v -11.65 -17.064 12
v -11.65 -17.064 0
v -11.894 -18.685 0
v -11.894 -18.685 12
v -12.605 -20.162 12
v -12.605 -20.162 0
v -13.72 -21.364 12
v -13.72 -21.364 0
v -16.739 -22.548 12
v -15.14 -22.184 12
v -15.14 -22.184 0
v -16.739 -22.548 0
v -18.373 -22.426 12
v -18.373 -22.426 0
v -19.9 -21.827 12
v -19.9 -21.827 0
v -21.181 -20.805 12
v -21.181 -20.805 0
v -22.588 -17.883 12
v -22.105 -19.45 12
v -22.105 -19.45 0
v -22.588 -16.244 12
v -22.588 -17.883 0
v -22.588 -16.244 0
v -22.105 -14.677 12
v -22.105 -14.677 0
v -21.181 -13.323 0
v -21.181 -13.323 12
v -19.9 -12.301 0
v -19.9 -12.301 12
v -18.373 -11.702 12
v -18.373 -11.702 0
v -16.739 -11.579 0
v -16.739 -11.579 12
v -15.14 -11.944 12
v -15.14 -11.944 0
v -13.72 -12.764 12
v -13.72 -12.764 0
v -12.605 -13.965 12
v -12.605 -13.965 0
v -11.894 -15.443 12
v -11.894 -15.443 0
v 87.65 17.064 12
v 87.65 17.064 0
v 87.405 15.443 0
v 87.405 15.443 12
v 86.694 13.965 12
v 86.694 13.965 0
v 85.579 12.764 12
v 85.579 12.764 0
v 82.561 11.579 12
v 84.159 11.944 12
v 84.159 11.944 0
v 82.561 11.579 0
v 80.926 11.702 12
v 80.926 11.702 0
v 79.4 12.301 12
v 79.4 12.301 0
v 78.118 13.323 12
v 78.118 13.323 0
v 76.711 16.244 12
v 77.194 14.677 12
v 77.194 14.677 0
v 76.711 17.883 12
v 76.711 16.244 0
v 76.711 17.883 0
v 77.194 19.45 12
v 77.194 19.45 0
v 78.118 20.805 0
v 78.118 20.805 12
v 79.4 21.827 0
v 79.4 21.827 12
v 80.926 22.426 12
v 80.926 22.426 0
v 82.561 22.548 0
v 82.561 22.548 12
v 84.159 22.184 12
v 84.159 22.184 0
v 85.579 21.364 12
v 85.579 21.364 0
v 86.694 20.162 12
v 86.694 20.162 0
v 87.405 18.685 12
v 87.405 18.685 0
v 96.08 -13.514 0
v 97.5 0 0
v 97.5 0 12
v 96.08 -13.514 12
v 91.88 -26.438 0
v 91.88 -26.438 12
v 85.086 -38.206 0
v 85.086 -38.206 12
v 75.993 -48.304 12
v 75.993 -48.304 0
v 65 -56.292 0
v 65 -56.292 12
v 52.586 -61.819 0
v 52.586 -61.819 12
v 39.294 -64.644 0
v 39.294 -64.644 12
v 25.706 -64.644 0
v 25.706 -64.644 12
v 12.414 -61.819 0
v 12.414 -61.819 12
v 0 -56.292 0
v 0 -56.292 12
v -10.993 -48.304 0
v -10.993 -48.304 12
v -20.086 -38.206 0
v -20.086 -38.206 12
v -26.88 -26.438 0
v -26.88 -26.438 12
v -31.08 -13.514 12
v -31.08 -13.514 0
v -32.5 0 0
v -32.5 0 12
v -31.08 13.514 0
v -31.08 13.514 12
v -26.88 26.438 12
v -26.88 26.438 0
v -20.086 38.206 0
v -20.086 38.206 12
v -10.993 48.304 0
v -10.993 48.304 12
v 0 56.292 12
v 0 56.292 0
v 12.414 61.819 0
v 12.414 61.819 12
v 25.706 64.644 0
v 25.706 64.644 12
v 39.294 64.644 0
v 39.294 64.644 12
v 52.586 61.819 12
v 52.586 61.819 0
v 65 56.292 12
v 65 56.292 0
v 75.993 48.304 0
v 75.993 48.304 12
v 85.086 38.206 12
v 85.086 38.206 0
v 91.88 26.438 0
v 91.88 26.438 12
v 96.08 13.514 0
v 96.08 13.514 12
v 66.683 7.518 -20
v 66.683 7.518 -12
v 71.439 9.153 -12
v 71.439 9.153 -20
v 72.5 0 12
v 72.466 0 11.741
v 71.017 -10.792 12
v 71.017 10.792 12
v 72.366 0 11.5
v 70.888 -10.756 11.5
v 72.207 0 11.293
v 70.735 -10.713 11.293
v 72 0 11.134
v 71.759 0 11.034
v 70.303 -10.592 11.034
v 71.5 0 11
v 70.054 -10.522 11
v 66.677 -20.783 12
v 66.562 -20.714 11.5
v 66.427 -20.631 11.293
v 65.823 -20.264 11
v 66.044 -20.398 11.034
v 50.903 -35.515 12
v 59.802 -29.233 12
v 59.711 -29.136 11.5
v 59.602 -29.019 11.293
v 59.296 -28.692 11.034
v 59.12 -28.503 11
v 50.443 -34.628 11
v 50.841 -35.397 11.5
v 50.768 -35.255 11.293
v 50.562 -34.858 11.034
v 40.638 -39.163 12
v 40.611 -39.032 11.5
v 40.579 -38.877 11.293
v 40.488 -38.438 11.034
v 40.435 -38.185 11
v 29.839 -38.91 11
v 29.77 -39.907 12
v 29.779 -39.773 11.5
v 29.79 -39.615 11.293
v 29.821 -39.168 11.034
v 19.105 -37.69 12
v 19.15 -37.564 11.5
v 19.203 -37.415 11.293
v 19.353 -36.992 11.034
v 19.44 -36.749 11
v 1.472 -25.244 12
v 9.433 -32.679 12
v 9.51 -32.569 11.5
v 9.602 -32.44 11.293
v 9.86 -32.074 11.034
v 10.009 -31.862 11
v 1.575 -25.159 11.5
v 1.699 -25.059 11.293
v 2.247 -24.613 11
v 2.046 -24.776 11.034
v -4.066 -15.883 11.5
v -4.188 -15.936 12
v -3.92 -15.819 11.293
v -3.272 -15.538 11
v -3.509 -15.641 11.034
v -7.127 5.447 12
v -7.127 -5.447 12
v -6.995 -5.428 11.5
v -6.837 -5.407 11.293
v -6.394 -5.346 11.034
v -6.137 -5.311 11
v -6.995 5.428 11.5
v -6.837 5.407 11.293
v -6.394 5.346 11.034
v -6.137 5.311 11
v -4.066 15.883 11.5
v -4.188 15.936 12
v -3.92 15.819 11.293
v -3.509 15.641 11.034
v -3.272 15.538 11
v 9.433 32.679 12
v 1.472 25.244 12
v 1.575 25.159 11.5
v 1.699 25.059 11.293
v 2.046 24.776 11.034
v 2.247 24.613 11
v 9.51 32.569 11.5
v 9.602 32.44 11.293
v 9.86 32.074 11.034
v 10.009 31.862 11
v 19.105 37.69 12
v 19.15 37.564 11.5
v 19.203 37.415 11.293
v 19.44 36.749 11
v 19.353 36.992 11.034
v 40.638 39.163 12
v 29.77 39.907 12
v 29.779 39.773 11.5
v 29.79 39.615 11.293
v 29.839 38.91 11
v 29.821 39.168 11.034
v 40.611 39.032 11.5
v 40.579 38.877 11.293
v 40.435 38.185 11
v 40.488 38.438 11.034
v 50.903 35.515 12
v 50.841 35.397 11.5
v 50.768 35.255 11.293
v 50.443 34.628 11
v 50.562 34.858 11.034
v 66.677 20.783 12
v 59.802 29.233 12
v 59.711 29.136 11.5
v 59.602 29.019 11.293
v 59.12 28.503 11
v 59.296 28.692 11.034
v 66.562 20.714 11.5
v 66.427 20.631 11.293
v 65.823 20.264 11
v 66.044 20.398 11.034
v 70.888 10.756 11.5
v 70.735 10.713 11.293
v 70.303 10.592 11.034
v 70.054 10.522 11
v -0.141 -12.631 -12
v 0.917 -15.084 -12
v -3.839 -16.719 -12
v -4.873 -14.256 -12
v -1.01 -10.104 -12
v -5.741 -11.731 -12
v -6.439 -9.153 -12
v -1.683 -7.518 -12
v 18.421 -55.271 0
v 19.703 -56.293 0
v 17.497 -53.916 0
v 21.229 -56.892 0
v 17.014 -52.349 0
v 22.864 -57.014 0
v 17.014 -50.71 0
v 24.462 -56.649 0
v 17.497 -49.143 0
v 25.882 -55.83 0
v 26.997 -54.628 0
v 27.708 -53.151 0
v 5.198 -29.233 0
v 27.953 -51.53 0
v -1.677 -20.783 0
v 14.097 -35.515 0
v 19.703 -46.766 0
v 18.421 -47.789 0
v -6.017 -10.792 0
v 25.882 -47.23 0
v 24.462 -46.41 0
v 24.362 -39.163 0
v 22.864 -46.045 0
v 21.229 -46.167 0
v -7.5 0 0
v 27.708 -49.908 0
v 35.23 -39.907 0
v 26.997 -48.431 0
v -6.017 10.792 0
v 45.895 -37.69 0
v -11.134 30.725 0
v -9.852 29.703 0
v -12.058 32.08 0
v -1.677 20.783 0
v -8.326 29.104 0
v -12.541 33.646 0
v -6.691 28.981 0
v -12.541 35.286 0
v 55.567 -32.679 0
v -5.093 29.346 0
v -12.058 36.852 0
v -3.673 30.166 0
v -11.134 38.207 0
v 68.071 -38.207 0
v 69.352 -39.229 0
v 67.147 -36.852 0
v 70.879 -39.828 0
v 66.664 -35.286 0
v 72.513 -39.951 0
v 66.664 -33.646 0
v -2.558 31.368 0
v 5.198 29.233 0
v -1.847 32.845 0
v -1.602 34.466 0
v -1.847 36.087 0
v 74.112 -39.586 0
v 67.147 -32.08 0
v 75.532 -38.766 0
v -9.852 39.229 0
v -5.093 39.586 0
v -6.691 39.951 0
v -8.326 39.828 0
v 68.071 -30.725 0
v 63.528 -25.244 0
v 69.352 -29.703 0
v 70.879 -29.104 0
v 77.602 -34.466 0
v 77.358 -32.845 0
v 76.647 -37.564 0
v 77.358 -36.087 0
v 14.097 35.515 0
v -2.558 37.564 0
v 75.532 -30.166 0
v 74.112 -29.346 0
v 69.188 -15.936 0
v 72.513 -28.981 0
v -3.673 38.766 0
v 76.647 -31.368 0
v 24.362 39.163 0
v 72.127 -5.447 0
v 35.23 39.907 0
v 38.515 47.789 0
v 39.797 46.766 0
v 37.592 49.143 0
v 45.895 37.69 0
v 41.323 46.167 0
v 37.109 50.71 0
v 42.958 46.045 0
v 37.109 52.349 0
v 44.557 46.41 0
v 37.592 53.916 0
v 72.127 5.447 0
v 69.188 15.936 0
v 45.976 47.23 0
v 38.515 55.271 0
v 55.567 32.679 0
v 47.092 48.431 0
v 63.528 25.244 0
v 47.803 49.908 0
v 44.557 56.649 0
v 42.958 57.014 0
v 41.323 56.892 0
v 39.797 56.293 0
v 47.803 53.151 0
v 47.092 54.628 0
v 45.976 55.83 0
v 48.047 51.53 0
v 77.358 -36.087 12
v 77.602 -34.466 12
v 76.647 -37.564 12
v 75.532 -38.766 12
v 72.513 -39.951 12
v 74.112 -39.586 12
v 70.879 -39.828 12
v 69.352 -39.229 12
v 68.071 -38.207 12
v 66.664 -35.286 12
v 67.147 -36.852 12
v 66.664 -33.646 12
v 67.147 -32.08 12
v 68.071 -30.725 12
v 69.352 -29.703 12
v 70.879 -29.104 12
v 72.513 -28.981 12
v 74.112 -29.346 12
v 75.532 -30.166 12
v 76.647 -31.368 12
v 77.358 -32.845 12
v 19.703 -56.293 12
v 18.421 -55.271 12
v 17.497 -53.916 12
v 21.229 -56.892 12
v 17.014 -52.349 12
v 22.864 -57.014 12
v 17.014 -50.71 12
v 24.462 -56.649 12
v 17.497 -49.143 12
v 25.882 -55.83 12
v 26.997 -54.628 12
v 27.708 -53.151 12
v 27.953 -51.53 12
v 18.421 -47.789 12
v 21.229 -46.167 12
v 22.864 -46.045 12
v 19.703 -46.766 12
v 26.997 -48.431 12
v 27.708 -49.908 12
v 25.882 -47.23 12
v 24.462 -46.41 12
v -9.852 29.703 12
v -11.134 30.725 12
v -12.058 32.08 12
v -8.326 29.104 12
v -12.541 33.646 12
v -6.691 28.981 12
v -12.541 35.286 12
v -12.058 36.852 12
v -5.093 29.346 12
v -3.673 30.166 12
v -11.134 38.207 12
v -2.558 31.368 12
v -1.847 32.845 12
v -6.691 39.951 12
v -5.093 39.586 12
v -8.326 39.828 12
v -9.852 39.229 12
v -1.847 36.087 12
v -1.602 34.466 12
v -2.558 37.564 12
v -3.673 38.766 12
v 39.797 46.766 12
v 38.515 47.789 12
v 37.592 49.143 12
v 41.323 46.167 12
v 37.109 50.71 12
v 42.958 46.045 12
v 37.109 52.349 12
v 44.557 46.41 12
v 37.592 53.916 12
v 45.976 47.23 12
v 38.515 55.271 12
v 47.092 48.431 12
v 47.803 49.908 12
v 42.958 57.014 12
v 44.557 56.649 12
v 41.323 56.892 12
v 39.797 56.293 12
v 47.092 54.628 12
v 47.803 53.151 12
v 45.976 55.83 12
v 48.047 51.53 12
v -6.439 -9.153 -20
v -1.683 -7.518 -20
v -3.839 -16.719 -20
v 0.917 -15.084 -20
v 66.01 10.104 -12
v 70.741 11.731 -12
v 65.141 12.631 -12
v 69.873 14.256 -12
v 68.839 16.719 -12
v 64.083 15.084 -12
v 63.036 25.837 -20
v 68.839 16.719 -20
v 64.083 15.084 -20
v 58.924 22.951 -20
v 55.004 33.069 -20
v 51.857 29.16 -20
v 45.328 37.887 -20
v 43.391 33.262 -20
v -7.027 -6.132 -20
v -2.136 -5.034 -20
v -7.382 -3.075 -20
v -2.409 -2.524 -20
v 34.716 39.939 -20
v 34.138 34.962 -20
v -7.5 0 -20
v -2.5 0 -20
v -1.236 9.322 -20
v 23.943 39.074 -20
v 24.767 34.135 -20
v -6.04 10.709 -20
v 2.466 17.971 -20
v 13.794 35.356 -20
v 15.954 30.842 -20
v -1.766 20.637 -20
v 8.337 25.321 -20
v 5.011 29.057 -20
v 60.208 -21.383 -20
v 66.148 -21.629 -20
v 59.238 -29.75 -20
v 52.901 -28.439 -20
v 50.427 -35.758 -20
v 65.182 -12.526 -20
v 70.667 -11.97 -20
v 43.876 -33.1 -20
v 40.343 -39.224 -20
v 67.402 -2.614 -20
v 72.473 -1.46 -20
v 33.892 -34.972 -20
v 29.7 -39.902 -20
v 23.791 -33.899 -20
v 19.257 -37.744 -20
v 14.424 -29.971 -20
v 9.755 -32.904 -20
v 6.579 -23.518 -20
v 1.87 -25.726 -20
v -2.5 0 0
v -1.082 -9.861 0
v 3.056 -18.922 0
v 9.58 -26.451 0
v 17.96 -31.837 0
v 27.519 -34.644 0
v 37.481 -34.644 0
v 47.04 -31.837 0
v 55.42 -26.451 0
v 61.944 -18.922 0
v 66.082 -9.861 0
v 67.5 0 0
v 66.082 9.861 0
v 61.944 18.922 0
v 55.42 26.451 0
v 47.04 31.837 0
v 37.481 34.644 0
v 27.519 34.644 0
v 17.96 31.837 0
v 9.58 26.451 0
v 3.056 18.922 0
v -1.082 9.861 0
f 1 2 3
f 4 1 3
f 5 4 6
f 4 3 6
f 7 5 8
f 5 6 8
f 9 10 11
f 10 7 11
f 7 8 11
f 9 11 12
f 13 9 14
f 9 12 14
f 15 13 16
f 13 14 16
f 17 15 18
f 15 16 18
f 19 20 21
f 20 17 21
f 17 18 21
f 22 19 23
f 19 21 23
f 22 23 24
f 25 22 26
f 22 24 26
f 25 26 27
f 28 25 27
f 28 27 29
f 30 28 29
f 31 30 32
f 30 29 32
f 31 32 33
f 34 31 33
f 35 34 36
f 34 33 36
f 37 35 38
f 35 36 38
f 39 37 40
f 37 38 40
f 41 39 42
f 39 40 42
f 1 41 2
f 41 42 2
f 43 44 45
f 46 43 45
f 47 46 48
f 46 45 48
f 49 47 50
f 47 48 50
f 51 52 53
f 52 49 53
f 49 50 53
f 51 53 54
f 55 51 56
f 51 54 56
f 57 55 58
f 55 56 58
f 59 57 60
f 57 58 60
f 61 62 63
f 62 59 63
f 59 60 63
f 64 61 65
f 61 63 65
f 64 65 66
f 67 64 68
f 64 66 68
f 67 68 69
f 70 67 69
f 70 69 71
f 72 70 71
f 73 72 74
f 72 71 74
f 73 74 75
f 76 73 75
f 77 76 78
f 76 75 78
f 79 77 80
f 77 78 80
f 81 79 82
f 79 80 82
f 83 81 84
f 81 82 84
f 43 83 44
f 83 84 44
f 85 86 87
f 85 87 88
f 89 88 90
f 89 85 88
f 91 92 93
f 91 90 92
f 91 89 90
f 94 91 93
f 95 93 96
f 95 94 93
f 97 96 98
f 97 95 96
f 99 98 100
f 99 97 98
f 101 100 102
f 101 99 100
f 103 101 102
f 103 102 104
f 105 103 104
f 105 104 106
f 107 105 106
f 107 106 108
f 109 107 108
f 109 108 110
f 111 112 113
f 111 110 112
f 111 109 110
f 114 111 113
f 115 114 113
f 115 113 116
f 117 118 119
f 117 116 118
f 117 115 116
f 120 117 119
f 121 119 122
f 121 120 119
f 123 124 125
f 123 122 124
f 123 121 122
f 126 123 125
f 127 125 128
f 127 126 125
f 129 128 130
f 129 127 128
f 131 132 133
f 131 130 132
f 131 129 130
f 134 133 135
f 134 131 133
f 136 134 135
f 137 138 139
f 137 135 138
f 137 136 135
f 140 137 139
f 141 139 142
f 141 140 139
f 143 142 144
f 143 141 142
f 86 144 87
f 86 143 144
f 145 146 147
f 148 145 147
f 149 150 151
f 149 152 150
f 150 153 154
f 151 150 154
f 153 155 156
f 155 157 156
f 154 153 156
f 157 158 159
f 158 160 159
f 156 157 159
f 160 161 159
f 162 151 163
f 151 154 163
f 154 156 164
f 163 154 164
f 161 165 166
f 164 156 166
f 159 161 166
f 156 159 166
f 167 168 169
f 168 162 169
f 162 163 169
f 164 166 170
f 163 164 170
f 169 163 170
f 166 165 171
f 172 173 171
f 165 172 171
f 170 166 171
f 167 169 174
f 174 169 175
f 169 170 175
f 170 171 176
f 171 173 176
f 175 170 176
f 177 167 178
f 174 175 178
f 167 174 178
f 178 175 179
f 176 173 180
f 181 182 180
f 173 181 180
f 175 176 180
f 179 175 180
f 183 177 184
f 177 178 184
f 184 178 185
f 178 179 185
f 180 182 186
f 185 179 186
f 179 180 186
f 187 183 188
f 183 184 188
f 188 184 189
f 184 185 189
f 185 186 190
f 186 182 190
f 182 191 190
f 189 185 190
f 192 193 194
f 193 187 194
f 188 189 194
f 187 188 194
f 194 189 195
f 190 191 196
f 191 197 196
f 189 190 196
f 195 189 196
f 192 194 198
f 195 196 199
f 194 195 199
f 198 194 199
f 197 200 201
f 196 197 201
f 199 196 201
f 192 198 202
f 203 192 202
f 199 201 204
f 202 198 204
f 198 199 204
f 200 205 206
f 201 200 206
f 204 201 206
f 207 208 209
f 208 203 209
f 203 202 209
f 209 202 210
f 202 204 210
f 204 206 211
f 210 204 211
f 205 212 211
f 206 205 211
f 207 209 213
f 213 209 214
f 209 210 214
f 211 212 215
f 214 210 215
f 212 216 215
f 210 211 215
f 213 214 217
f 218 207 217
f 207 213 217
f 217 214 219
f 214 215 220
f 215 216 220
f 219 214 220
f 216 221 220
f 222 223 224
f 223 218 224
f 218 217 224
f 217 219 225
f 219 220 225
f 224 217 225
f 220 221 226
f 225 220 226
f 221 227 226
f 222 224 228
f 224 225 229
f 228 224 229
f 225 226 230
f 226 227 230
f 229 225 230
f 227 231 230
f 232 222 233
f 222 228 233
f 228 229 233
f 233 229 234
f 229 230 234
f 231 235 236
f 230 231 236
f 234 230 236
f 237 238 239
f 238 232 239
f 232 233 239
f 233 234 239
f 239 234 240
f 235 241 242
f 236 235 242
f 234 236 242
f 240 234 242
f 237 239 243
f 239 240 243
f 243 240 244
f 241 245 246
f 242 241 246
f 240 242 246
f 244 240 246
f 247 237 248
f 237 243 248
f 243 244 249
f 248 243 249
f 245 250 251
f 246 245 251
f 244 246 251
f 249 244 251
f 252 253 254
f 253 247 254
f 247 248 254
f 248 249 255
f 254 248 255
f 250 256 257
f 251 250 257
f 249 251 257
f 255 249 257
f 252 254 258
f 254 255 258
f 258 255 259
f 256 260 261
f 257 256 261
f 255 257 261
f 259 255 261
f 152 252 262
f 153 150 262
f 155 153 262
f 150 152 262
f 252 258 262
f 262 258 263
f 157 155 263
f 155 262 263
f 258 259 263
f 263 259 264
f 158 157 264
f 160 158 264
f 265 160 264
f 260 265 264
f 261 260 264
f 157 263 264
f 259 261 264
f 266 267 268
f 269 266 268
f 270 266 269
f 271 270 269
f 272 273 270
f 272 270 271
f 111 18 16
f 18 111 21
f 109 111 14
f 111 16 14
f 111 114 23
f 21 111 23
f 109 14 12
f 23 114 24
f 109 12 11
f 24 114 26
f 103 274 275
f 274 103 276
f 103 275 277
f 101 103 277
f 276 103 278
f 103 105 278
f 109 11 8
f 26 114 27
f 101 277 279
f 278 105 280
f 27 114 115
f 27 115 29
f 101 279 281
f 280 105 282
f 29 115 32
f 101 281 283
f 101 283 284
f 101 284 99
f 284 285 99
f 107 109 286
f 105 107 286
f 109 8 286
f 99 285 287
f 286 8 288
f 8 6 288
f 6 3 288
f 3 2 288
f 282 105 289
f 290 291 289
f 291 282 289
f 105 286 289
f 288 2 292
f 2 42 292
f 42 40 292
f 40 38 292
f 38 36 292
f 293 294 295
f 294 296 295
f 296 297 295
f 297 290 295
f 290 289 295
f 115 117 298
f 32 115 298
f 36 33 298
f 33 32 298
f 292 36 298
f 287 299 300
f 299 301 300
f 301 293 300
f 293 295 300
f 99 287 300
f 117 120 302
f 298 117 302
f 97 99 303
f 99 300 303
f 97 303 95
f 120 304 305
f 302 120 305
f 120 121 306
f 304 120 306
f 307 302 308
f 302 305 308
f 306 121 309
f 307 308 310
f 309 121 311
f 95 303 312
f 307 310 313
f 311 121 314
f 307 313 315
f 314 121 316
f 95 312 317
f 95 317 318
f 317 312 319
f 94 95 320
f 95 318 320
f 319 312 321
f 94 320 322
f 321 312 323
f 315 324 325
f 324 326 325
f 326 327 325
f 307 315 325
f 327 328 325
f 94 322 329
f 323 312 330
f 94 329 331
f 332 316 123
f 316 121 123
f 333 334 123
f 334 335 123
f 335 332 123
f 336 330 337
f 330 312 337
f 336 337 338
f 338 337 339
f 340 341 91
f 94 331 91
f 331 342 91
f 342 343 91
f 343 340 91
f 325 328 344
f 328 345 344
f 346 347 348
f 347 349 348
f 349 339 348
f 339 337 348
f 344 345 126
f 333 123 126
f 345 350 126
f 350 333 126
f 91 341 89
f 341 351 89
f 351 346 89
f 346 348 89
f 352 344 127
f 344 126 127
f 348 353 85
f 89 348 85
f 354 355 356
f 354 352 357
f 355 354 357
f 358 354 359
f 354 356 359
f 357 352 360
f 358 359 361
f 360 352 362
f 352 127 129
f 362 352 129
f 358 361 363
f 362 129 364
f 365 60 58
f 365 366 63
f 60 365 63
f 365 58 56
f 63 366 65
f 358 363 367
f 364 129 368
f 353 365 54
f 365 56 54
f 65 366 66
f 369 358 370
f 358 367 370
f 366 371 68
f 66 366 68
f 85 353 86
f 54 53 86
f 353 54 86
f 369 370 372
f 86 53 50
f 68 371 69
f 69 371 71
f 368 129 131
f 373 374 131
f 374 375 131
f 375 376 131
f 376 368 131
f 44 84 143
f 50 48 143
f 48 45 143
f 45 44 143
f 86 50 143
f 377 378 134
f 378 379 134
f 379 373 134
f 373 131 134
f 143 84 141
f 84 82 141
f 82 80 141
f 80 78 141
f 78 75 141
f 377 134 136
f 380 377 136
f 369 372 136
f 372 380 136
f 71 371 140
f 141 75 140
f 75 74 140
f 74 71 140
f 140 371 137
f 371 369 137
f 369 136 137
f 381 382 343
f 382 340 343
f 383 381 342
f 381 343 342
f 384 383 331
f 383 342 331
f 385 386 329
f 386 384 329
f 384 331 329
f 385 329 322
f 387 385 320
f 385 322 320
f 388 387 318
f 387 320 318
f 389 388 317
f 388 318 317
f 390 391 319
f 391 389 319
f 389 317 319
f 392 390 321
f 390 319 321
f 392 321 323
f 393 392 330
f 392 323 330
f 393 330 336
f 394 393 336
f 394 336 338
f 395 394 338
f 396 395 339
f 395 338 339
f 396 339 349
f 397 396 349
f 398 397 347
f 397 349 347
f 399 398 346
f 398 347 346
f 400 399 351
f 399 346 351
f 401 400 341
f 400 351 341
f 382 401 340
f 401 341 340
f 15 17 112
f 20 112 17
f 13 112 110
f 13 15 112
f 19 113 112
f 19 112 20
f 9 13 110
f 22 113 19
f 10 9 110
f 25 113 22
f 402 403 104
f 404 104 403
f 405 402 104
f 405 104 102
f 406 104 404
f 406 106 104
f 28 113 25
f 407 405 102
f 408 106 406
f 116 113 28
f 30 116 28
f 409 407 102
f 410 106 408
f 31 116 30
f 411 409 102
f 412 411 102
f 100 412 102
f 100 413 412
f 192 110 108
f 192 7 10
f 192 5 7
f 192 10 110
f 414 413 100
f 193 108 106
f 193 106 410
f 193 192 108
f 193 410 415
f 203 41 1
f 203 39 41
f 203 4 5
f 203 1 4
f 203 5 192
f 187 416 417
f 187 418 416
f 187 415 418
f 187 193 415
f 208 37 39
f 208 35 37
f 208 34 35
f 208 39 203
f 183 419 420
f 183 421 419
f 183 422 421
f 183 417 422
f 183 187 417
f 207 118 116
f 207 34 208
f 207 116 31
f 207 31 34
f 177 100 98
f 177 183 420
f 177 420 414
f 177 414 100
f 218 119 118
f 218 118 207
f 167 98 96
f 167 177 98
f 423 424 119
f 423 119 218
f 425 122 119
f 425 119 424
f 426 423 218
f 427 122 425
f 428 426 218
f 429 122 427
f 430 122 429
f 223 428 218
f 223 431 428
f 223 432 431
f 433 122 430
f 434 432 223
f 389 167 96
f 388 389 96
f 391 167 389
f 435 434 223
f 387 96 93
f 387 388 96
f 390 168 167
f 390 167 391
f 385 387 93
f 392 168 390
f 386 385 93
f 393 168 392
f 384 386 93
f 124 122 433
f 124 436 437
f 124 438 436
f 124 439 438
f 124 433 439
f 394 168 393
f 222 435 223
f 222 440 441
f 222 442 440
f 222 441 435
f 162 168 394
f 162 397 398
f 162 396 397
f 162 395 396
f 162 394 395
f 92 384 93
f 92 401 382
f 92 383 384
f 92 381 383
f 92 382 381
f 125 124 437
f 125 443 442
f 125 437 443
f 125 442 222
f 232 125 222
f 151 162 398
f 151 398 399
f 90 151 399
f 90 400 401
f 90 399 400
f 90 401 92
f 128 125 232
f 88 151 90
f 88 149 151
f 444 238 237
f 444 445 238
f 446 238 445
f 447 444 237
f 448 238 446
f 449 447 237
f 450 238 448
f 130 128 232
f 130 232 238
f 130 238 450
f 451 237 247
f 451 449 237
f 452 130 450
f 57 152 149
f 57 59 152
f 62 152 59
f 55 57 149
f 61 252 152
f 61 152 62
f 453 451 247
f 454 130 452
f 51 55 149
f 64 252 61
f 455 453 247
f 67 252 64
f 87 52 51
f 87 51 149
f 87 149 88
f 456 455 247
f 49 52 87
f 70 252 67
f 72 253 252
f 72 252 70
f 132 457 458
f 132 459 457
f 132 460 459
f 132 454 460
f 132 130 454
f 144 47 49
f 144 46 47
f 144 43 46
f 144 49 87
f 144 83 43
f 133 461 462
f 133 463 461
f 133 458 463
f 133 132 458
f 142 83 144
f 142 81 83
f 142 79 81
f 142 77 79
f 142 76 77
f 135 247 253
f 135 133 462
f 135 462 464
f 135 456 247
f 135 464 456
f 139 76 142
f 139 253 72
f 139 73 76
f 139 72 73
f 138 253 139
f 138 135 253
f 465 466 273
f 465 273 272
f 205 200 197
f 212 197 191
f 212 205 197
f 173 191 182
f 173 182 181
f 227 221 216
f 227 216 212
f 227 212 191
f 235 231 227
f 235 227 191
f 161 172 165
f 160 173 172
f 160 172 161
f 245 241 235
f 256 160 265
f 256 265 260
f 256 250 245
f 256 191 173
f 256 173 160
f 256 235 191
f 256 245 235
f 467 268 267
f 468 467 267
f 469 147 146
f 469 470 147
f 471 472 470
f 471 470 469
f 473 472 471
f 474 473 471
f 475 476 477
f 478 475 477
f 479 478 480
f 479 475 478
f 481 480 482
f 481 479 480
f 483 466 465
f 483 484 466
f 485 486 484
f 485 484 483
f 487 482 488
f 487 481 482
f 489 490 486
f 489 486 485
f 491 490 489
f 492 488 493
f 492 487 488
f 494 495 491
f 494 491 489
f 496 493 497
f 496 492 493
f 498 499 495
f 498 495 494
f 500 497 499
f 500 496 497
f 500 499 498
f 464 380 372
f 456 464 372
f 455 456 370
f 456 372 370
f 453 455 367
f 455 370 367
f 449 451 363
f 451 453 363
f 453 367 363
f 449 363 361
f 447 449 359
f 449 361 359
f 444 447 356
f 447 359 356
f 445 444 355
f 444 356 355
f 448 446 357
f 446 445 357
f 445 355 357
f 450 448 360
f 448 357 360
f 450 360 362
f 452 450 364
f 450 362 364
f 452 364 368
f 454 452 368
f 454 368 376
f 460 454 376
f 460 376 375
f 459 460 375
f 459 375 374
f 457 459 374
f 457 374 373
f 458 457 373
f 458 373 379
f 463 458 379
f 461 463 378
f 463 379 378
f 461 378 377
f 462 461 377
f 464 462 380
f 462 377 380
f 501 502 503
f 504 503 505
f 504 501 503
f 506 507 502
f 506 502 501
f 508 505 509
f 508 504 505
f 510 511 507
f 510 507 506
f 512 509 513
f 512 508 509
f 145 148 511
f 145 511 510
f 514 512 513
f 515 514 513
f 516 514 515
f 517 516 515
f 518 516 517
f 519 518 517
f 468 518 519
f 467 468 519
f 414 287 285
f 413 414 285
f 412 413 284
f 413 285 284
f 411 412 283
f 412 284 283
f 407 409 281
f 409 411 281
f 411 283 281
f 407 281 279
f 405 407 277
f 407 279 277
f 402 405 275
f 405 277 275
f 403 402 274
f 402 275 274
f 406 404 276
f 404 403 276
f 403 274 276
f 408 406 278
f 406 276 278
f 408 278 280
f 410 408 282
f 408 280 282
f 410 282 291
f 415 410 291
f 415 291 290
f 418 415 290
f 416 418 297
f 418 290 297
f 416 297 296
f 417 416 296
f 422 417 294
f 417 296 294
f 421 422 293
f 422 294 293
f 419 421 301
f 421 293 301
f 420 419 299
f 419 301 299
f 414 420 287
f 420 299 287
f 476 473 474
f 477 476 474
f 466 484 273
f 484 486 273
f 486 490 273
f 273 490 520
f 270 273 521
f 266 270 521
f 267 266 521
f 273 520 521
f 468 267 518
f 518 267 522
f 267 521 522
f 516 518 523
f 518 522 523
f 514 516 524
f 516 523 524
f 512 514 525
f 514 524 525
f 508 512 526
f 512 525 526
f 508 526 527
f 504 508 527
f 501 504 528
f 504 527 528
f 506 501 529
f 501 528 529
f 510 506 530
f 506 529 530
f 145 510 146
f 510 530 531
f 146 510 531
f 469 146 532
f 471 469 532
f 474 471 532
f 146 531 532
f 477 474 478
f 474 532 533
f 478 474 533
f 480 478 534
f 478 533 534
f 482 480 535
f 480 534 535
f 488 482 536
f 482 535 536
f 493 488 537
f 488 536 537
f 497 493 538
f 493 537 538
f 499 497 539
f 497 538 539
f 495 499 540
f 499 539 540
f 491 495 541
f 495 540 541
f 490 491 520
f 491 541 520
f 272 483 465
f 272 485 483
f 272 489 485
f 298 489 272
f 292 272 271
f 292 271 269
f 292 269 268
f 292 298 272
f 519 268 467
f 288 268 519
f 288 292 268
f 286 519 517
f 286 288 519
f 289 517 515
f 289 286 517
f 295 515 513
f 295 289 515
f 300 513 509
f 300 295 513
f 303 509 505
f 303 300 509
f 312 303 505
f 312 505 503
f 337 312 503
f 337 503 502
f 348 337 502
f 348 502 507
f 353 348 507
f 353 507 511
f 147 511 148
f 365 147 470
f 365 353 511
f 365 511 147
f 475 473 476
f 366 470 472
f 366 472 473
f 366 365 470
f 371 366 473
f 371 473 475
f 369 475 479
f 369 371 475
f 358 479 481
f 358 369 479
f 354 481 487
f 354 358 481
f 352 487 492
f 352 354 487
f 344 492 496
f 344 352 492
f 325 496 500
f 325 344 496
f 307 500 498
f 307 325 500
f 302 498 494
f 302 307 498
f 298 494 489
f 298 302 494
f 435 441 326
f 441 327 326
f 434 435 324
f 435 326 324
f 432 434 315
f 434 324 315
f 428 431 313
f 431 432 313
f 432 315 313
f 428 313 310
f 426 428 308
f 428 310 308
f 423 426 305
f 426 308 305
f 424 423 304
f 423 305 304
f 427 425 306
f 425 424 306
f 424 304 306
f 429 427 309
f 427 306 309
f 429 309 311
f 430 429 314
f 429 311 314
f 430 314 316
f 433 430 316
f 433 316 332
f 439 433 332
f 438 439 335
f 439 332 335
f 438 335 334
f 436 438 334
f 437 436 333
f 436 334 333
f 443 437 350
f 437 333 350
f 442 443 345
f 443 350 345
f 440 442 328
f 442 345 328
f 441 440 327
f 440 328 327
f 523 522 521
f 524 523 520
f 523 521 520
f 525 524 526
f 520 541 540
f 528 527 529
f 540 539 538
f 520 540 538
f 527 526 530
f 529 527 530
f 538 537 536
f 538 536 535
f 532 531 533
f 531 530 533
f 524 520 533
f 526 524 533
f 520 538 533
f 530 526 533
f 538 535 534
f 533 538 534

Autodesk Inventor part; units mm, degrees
ref_plane "YZ Plane" through (0, 0, 0) normal (1, 0, 0) x (0, 1, 0)
ref_plane "工作平面1" through (0, 0, 0) normal (0, 0, 1) x (1, 0, 0)
sketch "草图1" plane through (0, 0, 0) normal (0, 0, 1) x (1, 0, 0)
  arc A0 (32.5, 65) -> (32.5, -65) centre (32.5, 0) ccw construction
  line L0 (32.5, -65) -> (32.5, -40) construction
  arc A1 (32.5, 40) -> (32.5, -40) centre (32.5, 0) ccw construction
  line L1 (32.5, 40) -> (32.5, 65) construction
  circle A2 centre (32.5, 0) radius 65 projected
  circle A3 centre (72.1024, -34.466) radius 5.5 projected
  circle A4 centre (-17.1496, -17.0637) radius 5.5 projected
  circle A5 centre (82.1496, 17.0637) radius 5.5 projected
  circle A6 centre (42.5472, 51.5296) radius 5.5 projected
  circle A7 centre (22.4528, -51.5296) radius 5.5 projected
  circle A8 centre (-7.1024, 34.466) radius 5.5 projected
  circle A9 centre (32.5, 0) radius 65 projected
  circle A10 centre (32.5, 0) radius 40 construction
  point P0 (0, 0)
extrude "拉伸1" add sketch "草图1" along normal blind 12
sketch "草图2" plane through (32.5, 0, 0) normal (0, 0, -1) x (-1, 0, 0)
  circle A0 centre (0, 0) radius 65 construction
  circle A1 centre (0, 0) radius 40
  circle A2 centre (0, 0) radius 35
  point P0 (32.5, 0)
  dimension "d2" = 80
  dimension "d3" = 70
extrude "拉伸2" add sketch "草图2" along normal blind 20
sketch "草图3" plane through (32.5, 0, 12) normal (0, 0, 1) x (1, 0, 0)
  circle A0 centre (0, 0) radius 65 construction
  circle A1 centre (0, 0) radius 40
  point P0 (-32.5, 0)
  dimension "d6" = 80
extrude "拉伸3" cut sketch "草图3" against normal blind 1
fillet "圆角1" radius 1 1 edges at (-7.5, 0, 11)
sketch "草图4" plane through (32.5, 0, -20) normal (0, 0, -1) x (-1, 0, 0)
  circle A0 centre (0, 0) radius 35 construction
  circle A1 centre (49.6496, -17.0637) radius 5.5 construction
  circle A2 centre (-49.6496, 17.0637) radius 5.5 construction
  line L0 (49.6496, -17.0637) -> (-49.6496, 17.0637) construction
  line L1 (66.9706, -27.2462) -> (-94.2998, 28.1795)
  line L2 (-94.2998, 28.1795) -> (-91.6996, 35.7451)
  line L3 (-91.6996, 35.7451) -> (69.5708, -19.6806)
  line L4 (69.5708, -19.6806) -> (66.9706, -27.2462)
  point P0 (32.5, 0)
  dimension "d10" = 8
extrude "拉伸4" cut sketch "草图4" against normal blind 8
ref_plane "工作平面2" through (-0.3829, -11.3012, -12) normal (-0.325, 0.9457, 0) x (0.9457, 0.325, 0)
properties part number "轴承通盖1"
